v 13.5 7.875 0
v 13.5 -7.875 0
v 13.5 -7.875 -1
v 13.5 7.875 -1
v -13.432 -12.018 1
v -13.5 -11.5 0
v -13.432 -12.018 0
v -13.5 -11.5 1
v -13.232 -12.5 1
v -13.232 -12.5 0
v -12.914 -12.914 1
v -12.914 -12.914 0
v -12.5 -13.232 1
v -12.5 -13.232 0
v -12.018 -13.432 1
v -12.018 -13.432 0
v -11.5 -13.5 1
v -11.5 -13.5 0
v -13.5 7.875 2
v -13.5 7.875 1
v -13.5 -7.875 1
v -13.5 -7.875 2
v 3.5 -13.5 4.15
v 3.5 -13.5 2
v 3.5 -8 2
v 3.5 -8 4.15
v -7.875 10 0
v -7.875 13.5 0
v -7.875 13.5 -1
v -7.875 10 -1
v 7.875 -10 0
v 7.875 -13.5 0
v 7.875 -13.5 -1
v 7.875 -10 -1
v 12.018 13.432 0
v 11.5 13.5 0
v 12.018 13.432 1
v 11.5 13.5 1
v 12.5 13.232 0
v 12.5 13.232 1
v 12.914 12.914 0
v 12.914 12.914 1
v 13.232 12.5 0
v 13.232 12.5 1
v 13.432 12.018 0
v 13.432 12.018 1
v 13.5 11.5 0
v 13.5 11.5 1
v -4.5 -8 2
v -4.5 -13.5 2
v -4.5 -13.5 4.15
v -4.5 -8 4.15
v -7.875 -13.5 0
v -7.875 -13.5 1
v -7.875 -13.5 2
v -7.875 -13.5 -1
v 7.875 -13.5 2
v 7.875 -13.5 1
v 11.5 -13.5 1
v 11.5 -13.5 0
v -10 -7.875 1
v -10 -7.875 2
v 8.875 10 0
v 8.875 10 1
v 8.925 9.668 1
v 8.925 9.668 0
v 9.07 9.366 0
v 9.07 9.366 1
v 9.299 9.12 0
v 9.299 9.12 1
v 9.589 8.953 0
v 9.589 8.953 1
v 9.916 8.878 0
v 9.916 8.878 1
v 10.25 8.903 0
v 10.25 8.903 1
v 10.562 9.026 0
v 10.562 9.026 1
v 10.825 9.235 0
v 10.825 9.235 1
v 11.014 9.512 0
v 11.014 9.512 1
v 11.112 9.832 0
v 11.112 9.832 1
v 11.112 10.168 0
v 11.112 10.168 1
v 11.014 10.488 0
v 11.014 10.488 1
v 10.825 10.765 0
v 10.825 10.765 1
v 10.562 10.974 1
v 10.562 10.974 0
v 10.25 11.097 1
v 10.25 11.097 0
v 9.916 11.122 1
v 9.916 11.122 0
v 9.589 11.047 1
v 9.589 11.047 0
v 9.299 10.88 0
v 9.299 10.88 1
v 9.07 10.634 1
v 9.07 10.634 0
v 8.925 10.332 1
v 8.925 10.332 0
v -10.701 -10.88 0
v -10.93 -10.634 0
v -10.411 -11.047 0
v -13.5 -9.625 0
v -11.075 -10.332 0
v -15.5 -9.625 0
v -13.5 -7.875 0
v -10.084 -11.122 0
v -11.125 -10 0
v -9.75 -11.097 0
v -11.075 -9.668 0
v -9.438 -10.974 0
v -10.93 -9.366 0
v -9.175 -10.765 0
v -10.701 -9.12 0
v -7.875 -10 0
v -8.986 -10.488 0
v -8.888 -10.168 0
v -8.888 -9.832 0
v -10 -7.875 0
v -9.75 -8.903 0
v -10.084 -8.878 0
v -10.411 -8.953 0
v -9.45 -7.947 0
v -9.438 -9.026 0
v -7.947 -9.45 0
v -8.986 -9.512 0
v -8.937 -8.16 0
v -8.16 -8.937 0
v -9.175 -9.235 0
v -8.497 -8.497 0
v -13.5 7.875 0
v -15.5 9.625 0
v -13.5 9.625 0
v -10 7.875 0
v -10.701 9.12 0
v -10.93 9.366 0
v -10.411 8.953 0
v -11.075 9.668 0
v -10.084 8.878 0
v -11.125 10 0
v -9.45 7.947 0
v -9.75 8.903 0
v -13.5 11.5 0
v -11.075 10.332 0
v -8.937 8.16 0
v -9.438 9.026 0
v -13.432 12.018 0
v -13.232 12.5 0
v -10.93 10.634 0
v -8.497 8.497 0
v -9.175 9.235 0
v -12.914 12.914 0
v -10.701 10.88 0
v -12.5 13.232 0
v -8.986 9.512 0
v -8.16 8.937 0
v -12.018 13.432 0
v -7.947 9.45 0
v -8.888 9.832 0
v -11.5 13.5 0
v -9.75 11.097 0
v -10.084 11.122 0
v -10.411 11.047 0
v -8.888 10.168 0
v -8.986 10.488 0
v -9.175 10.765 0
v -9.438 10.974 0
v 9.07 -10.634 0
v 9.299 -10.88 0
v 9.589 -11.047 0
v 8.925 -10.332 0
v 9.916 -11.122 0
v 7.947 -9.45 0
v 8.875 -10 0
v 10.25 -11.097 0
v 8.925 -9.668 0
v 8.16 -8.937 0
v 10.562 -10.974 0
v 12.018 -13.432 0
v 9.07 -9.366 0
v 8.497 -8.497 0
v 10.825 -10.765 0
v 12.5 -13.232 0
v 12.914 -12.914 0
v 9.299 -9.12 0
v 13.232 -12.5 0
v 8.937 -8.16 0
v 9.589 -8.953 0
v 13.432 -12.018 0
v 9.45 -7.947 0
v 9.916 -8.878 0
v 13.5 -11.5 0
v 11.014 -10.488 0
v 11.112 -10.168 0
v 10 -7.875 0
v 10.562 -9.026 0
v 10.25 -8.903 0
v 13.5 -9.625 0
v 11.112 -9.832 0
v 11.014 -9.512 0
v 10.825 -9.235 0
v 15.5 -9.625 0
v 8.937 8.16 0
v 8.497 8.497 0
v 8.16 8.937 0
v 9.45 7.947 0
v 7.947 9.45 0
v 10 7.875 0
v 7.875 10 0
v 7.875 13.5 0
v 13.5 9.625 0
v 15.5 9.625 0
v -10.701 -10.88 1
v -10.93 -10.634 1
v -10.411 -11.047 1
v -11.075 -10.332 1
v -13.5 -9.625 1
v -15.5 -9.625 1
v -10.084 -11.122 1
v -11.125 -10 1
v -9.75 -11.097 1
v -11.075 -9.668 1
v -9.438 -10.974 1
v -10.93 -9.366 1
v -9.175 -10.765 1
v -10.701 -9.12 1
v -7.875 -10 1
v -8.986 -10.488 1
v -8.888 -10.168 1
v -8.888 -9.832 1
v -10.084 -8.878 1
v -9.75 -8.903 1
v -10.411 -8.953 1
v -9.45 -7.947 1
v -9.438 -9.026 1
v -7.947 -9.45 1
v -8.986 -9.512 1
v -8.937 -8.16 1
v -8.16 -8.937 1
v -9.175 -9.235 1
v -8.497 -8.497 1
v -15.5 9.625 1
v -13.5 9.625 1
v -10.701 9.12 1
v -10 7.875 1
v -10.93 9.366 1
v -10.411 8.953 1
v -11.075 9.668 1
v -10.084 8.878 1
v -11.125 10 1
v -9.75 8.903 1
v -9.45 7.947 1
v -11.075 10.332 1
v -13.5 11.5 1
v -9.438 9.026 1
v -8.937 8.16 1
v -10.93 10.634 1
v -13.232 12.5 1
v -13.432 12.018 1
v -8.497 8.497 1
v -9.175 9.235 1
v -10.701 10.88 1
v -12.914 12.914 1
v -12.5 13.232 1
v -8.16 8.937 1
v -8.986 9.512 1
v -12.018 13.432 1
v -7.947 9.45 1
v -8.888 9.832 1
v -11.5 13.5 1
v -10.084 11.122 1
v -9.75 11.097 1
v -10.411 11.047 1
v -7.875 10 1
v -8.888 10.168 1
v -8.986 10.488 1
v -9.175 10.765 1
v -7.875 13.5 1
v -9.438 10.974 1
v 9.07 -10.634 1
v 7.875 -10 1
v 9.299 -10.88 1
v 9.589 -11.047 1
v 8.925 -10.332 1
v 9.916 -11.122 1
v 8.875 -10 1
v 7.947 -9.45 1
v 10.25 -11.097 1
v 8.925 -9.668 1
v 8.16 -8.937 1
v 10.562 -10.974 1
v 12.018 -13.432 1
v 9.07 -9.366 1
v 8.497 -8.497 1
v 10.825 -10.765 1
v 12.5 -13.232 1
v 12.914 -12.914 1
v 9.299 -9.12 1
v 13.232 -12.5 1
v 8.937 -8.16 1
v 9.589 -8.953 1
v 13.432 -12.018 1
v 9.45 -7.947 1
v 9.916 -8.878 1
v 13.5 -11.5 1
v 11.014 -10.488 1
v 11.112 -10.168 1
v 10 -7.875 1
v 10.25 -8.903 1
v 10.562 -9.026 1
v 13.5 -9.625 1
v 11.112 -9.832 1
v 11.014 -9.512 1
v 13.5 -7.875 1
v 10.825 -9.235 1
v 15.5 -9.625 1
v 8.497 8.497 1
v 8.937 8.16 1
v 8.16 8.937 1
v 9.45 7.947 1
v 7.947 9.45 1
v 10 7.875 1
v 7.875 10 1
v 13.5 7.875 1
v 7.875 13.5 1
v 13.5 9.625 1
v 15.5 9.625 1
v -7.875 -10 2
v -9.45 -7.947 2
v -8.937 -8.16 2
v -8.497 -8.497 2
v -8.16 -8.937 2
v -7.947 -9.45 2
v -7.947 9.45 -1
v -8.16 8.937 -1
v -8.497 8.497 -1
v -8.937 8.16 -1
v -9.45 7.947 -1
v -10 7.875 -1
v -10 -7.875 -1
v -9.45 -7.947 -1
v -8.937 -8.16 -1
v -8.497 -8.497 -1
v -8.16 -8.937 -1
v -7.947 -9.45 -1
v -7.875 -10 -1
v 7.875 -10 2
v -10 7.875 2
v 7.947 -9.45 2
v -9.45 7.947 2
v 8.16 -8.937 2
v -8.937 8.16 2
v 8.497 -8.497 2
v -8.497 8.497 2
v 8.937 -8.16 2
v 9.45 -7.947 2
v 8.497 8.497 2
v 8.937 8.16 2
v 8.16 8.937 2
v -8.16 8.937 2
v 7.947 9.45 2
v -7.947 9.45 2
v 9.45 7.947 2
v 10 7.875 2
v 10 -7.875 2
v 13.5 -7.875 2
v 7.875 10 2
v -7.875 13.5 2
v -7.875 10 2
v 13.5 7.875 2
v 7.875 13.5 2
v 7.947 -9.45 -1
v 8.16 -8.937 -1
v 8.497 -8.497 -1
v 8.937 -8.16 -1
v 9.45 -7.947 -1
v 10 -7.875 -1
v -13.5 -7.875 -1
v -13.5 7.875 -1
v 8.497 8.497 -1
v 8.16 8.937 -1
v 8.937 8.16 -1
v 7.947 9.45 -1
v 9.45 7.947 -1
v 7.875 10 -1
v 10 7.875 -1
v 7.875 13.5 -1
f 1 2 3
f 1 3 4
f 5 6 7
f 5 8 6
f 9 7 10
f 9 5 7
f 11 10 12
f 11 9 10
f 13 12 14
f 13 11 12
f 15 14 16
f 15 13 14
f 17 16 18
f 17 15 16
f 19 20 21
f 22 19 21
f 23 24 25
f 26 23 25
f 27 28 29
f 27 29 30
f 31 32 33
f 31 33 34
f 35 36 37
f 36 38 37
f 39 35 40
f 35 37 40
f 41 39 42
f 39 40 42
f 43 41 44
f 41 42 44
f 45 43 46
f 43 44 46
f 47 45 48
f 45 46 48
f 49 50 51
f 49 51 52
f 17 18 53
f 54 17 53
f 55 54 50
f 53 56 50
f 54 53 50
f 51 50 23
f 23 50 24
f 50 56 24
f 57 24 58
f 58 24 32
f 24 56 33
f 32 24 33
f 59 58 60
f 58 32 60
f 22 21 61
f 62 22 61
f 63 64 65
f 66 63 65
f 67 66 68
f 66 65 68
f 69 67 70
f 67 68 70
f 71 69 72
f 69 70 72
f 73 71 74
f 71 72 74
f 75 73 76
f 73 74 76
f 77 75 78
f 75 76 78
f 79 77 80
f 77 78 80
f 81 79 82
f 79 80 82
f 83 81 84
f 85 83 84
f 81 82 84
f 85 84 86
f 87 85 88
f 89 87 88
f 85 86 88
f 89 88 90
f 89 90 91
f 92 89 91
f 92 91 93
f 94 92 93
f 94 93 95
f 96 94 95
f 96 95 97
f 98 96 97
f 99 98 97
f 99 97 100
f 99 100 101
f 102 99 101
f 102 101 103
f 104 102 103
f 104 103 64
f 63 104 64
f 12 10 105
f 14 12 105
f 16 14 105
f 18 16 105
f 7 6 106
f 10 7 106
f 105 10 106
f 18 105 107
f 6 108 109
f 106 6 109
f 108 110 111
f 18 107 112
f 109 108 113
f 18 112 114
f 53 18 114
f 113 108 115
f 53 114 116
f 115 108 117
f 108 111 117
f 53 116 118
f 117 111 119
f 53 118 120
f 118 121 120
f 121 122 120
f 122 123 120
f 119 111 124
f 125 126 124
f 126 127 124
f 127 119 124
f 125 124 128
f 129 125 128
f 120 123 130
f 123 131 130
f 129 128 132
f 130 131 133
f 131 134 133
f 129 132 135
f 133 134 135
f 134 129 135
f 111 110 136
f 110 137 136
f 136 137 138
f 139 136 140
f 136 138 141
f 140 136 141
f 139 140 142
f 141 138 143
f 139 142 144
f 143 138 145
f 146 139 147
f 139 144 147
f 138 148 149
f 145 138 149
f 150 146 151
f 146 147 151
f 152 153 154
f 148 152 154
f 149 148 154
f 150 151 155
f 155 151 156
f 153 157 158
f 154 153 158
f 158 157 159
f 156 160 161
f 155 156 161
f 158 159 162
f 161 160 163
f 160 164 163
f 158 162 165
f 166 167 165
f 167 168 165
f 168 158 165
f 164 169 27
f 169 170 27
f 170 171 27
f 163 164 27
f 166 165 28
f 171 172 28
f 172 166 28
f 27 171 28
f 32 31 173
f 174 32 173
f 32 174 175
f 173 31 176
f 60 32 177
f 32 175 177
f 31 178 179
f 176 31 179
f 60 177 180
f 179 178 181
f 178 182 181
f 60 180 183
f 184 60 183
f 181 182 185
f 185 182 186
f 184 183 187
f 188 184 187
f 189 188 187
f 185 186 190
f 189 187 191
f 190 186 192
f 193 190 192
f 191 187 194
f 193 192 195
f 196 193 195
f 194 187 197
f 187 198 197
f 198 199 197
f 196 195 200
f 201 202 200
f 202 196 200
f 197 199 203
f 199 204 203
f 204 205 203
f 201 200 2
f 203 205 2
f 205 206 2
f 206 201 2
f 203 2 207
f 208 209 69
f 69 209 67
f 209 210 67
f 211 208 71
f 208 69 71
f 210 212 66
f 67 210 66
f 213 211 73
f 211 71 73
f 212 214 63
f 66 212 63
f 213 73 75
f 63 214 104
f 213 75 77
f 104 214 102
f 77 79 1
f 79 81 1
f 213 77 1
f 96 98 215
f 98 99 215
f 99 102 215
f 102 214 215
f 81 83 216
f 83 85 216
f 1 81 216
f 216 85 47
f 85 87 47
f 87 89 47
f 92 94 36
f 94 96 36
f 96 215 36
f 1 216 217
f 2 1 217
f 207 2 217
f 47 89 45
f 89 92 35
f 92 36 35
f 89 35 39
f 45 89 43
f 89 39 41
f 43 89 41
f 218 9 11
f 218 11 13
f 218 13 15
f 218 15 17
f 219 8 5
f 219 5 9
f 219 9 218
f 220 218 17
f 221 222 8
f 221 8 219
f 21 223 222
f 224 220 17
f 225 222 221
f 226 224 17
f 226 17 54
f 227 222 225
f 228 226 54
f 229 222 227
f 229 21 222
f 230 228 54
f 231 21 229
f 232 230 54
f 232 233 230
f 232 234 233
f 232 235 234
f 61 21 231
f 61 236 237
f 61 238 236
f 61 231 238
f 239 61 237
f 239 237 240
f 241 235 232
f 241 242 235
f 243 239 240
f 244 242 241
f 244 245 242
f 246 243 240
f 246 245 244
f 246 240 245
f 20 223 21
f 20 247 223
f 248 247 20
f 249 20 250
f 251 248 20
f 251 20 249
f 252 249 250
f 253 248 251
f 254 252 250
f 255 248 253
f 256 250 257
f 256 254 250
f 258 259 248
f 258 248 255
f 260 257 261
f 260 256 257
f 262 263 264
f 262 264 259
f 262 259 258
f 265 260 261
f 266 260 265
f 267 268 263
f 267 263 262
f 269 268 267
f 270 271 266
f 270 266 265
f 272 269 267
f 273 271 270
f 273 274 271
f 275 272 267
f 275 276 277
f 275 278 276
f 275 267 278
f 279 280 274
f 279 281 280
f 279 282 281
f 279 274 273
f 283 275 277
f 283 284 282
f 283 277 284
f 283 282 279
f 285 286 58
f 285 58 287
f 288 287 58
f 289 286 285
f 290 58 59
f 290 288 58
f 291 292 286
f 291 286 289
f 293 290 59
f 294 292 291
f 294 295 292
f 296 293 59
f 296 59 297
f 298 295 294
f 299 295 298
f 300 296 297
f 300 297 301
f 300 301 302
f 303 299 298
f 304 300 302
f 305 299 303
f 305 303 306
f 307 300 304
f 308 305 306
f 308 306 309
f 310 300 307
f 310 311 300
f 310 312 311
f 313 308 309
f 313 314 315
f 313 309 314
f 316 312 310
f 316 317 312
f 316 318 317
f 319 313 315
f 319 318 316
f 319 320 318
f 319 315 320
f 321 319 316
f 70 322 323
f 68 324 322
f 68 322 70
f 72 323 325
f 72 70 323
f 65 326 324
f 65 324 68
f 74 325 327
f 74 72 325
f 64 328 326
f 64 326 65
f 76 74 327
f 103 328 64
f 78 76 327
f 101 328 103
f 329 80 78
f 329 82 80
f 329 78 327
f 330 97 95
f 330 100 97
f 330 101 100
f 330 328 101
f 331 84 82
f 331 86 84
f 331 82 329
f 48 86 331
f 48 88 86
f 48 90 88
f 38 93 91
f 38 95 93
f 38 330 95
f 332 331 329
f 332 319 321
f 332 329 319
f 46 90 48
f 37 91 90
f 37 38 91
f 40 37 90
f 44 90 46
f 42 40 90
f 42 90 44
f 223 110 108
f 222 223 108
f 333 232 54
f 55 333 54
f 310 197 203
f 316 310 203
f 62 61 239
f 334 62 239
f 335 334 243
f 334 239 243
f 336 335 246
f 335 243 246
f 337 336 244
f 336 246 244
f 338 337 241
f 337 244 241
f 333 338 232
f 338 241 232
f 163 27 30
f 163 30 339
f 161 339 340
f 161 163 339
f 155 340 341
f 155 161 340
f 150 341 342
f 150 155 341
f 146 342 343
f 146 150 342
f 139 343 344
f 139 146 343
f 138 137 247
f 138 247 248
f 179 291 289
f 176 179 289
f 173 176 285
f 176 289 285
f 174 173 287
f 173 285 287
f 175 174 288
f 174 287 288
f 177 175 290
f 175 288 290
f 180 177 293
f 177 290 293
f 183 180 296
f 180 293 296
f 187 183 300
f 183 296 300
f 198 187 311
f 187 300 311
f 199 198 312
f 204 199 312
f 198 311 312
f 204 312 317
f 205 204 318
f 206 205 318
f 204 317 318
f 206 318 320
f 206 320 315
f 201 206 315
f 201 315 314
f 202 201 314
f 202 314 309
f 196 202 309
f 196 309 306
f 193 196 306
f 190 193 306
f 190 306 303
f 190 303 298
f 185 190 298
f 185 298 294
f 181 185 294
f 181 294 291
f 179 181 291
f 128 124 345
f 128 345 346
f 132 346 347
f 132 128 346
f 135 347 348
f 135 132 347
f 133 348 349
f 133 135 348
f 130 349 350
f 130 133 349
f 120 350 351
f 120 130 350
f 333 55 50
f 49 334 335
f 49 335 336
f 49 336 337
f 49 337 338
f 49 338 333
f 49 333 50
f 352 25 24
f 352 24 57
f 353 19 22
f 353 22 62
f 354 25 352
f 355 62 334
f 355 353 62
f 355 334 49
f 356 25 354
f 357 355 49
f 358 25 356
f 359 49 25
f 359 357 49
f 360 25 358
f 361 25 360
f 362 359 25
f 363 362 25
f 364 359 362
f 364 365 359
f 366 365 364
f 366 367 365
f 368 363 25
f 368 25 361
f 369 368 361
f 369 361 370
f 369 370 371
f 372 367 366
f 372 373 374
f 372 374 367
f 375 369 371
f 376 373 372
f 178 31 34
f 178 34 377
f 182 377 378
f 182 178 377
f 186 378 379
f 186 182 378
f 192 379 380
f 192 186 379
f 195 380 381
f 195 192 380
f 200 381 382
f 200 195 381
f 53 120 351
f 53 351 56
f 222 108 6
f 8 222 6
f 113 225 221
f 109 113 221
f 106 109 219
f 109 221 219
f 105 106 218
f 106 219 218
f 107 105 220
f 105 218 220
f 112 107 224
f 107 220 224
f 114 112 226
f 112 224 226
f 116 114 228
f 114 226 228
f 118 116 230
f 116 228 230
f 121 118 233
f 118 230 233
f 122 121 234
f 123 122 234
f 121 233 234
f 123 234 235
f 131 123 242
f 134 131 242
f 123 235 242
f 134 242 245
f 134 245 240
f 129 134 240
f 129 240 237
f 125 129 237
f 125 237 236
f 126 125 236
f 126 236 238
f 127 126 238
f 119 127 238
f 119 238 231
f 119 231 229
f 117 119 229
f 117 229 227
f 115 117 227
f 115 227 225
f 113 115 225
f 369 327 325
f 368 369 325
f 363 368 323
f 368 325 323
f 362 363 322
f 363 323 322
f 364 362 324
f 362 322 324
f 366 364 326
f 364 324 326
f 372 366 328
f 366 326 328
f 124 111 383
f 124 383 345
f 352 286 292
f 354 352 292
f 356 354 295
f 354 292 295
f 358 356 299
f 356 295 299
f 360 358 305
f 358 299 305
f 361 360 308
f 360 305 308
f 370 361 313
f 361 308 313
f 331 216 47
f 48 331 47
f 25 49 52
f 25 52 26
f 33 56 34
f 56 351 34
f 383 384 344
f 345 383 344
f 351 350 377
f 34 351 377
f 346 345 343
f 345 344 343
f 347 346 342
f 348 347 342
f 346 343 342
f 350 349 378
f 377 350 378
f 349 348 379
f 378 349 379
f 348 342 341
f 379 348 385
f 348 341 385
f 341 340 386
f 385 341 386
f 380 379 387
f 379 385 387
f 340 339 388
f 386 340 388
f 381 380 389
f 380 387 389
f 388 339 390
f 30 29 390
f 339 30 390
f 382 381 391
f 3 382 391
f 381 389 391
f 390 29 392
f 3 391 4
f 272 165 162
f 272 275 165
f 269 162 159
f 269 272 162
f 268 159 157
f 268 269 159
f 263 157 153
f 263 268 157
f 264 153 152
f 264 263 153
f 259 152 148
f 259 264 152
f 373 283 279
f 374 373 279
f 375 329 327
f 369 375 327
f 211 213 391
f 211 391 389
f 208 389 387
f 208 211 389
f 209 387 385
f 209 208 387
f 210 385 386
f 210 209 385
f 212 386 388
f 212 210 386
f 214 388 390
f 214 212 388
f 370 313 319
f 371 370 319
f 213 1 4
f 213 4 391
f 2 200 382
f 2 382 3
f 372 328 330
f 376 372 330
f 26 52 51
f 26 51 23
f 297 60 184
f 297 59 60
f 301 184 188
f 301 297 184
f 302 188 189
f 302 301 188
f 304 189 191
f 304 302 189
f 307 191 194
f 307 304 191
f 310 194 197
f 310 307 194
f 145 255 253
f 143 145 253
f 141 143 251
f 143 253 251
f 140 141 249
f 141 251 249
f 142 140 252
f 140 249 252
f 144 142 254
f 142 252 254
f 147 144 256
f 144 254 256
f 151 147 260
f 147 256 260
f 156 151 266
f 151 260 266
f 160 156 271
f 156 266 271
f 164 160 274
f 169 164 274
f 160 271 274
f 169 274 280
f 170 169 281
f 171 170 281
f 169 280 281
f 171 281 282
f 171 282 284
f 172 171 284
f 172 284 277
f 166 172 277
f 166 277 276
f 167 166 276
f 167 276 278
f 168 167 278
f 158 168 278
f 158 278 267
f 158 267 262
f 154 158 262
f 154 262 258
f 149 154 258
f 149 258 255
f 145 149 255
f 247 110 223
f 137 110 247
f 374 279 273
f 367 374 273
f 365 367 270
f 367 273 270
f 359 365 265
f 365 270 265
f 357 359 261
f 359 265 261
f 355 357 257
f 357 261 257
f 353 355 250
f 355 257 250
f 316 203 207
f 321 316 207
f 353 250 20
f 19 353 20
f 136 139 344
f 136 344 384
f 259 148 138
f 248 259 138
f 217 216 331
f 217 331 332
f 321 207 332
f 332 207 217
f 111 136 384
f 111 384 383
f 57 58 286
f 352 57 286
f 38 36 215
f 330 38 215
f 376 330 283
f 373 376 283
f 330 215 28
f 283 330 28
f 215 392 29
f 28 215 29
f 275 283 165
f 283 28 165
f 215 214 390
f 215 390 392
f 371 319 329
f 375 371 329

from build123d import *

# Parameters (mm, degrees)
F0_W          = 2
F0_H          = 19.25
F1_DEPTH      = 1
F2_R          = 2
F3_D          = 2.25
F4_W          = 8
F4_H          = 5.5
F5_DEPTH      = 3.15
F7_DEPTH      = 2
F7_DEPTH_BACK = 1


with BuildPart() as f1:
    # F0 (on Top) → F1 (new body)
    with BuildSketch(Plane.XY):
        Polygon((13.5, 9.625), (13.5, 13.5), (-13.5, 13.5), (-13.5, 9.625), (-13.5, -9.625), (-13.5, -13.5), (13.5, -13.5), (13.5, -9.625), align=None)
        with Locations((14.5, 0)):
            Rectangle(F0_W, F0_H)
        with Locations((-14.5, 0)):
            Rectangle(F0_W, F0_H)
    extrude(amount=F1_DEPTH)

    # F2
    f2_edges = [f1.edges().sort_by_distance(p)[0] for p in [
        (-13.5, -13.5, 0.5),
        (13.5, -13.5, 0.5),
        (13.5, 13.5, 0.5),
        (-13.5, 13.5, 0.5),
    ]]
    fillet(f2_edges, radius=F2_R)

    # F3 (through all)
    with Locations(Plane(origin=(0, 0, 0), x_dir=(1, 0, 0), z_dir=(0, 0, -1))):
        with Locations((-10, 10), (10, 10), (10, -10), (-10, -10)):
            Hole(F3_D / 2)

    # F4 (on face) → F5 (join)
    with BuildSketch(Plane.XY.offset(1)):
        with Locations((-0.5, -10.75)):
            Rectangle(F4_W, F4_H)
    extrude(amount=F5_DEPTH)

    # F6 (on Top) → F7 (join, two sides)
    with BuildSketch(Plane.XY) as f7_sk:
        with BuildLine():
            Line((-7.875, -13.5), (7.875, -13.5))
            Line((7.875, -13.5), (7.875, -10))
            ThreePointArc((7.875, -10), (8.497398, -8.497398), (10, -7.875))
            Line((10, -7.875), (13.5, -7.875))
            Line((13.5, -7.875), (13.5, 7.875))
            Line((13.5, 7.875), (10, 7.875))
            ThreePointArc((10, 7.875), (8.497398, 8.497398), (7.875, 10))
            Line((7.875, 10), (7.875, 13.5))
            Line((7.875, 13.5), (-7.875, 13.5))
            Line((-7.875, 13.5), (-7.875, 10))
            ThreePointArc((-7.875, 10), (-8.497398, 8.497398), (-10, 7.875))
            Line((-10, 7.875), (-13.5, 7.875))
            Line((-13.5, 7.875), (-13.5, -7.875))
            Line((-13.5, -7.875), (-10, -7.875))
            ThreePointArc((-10, -7.875), (-8.497398, -8.497398), (-7.875, -10))
            Line((-7.875, -10), (-7.875, -13.5))
        make_face()
    extrude(amount=F7_DEPTH)
    extrude(f7_sk.sketch, amount=-F7_DEPTH_BACK)


solid = f1.part
